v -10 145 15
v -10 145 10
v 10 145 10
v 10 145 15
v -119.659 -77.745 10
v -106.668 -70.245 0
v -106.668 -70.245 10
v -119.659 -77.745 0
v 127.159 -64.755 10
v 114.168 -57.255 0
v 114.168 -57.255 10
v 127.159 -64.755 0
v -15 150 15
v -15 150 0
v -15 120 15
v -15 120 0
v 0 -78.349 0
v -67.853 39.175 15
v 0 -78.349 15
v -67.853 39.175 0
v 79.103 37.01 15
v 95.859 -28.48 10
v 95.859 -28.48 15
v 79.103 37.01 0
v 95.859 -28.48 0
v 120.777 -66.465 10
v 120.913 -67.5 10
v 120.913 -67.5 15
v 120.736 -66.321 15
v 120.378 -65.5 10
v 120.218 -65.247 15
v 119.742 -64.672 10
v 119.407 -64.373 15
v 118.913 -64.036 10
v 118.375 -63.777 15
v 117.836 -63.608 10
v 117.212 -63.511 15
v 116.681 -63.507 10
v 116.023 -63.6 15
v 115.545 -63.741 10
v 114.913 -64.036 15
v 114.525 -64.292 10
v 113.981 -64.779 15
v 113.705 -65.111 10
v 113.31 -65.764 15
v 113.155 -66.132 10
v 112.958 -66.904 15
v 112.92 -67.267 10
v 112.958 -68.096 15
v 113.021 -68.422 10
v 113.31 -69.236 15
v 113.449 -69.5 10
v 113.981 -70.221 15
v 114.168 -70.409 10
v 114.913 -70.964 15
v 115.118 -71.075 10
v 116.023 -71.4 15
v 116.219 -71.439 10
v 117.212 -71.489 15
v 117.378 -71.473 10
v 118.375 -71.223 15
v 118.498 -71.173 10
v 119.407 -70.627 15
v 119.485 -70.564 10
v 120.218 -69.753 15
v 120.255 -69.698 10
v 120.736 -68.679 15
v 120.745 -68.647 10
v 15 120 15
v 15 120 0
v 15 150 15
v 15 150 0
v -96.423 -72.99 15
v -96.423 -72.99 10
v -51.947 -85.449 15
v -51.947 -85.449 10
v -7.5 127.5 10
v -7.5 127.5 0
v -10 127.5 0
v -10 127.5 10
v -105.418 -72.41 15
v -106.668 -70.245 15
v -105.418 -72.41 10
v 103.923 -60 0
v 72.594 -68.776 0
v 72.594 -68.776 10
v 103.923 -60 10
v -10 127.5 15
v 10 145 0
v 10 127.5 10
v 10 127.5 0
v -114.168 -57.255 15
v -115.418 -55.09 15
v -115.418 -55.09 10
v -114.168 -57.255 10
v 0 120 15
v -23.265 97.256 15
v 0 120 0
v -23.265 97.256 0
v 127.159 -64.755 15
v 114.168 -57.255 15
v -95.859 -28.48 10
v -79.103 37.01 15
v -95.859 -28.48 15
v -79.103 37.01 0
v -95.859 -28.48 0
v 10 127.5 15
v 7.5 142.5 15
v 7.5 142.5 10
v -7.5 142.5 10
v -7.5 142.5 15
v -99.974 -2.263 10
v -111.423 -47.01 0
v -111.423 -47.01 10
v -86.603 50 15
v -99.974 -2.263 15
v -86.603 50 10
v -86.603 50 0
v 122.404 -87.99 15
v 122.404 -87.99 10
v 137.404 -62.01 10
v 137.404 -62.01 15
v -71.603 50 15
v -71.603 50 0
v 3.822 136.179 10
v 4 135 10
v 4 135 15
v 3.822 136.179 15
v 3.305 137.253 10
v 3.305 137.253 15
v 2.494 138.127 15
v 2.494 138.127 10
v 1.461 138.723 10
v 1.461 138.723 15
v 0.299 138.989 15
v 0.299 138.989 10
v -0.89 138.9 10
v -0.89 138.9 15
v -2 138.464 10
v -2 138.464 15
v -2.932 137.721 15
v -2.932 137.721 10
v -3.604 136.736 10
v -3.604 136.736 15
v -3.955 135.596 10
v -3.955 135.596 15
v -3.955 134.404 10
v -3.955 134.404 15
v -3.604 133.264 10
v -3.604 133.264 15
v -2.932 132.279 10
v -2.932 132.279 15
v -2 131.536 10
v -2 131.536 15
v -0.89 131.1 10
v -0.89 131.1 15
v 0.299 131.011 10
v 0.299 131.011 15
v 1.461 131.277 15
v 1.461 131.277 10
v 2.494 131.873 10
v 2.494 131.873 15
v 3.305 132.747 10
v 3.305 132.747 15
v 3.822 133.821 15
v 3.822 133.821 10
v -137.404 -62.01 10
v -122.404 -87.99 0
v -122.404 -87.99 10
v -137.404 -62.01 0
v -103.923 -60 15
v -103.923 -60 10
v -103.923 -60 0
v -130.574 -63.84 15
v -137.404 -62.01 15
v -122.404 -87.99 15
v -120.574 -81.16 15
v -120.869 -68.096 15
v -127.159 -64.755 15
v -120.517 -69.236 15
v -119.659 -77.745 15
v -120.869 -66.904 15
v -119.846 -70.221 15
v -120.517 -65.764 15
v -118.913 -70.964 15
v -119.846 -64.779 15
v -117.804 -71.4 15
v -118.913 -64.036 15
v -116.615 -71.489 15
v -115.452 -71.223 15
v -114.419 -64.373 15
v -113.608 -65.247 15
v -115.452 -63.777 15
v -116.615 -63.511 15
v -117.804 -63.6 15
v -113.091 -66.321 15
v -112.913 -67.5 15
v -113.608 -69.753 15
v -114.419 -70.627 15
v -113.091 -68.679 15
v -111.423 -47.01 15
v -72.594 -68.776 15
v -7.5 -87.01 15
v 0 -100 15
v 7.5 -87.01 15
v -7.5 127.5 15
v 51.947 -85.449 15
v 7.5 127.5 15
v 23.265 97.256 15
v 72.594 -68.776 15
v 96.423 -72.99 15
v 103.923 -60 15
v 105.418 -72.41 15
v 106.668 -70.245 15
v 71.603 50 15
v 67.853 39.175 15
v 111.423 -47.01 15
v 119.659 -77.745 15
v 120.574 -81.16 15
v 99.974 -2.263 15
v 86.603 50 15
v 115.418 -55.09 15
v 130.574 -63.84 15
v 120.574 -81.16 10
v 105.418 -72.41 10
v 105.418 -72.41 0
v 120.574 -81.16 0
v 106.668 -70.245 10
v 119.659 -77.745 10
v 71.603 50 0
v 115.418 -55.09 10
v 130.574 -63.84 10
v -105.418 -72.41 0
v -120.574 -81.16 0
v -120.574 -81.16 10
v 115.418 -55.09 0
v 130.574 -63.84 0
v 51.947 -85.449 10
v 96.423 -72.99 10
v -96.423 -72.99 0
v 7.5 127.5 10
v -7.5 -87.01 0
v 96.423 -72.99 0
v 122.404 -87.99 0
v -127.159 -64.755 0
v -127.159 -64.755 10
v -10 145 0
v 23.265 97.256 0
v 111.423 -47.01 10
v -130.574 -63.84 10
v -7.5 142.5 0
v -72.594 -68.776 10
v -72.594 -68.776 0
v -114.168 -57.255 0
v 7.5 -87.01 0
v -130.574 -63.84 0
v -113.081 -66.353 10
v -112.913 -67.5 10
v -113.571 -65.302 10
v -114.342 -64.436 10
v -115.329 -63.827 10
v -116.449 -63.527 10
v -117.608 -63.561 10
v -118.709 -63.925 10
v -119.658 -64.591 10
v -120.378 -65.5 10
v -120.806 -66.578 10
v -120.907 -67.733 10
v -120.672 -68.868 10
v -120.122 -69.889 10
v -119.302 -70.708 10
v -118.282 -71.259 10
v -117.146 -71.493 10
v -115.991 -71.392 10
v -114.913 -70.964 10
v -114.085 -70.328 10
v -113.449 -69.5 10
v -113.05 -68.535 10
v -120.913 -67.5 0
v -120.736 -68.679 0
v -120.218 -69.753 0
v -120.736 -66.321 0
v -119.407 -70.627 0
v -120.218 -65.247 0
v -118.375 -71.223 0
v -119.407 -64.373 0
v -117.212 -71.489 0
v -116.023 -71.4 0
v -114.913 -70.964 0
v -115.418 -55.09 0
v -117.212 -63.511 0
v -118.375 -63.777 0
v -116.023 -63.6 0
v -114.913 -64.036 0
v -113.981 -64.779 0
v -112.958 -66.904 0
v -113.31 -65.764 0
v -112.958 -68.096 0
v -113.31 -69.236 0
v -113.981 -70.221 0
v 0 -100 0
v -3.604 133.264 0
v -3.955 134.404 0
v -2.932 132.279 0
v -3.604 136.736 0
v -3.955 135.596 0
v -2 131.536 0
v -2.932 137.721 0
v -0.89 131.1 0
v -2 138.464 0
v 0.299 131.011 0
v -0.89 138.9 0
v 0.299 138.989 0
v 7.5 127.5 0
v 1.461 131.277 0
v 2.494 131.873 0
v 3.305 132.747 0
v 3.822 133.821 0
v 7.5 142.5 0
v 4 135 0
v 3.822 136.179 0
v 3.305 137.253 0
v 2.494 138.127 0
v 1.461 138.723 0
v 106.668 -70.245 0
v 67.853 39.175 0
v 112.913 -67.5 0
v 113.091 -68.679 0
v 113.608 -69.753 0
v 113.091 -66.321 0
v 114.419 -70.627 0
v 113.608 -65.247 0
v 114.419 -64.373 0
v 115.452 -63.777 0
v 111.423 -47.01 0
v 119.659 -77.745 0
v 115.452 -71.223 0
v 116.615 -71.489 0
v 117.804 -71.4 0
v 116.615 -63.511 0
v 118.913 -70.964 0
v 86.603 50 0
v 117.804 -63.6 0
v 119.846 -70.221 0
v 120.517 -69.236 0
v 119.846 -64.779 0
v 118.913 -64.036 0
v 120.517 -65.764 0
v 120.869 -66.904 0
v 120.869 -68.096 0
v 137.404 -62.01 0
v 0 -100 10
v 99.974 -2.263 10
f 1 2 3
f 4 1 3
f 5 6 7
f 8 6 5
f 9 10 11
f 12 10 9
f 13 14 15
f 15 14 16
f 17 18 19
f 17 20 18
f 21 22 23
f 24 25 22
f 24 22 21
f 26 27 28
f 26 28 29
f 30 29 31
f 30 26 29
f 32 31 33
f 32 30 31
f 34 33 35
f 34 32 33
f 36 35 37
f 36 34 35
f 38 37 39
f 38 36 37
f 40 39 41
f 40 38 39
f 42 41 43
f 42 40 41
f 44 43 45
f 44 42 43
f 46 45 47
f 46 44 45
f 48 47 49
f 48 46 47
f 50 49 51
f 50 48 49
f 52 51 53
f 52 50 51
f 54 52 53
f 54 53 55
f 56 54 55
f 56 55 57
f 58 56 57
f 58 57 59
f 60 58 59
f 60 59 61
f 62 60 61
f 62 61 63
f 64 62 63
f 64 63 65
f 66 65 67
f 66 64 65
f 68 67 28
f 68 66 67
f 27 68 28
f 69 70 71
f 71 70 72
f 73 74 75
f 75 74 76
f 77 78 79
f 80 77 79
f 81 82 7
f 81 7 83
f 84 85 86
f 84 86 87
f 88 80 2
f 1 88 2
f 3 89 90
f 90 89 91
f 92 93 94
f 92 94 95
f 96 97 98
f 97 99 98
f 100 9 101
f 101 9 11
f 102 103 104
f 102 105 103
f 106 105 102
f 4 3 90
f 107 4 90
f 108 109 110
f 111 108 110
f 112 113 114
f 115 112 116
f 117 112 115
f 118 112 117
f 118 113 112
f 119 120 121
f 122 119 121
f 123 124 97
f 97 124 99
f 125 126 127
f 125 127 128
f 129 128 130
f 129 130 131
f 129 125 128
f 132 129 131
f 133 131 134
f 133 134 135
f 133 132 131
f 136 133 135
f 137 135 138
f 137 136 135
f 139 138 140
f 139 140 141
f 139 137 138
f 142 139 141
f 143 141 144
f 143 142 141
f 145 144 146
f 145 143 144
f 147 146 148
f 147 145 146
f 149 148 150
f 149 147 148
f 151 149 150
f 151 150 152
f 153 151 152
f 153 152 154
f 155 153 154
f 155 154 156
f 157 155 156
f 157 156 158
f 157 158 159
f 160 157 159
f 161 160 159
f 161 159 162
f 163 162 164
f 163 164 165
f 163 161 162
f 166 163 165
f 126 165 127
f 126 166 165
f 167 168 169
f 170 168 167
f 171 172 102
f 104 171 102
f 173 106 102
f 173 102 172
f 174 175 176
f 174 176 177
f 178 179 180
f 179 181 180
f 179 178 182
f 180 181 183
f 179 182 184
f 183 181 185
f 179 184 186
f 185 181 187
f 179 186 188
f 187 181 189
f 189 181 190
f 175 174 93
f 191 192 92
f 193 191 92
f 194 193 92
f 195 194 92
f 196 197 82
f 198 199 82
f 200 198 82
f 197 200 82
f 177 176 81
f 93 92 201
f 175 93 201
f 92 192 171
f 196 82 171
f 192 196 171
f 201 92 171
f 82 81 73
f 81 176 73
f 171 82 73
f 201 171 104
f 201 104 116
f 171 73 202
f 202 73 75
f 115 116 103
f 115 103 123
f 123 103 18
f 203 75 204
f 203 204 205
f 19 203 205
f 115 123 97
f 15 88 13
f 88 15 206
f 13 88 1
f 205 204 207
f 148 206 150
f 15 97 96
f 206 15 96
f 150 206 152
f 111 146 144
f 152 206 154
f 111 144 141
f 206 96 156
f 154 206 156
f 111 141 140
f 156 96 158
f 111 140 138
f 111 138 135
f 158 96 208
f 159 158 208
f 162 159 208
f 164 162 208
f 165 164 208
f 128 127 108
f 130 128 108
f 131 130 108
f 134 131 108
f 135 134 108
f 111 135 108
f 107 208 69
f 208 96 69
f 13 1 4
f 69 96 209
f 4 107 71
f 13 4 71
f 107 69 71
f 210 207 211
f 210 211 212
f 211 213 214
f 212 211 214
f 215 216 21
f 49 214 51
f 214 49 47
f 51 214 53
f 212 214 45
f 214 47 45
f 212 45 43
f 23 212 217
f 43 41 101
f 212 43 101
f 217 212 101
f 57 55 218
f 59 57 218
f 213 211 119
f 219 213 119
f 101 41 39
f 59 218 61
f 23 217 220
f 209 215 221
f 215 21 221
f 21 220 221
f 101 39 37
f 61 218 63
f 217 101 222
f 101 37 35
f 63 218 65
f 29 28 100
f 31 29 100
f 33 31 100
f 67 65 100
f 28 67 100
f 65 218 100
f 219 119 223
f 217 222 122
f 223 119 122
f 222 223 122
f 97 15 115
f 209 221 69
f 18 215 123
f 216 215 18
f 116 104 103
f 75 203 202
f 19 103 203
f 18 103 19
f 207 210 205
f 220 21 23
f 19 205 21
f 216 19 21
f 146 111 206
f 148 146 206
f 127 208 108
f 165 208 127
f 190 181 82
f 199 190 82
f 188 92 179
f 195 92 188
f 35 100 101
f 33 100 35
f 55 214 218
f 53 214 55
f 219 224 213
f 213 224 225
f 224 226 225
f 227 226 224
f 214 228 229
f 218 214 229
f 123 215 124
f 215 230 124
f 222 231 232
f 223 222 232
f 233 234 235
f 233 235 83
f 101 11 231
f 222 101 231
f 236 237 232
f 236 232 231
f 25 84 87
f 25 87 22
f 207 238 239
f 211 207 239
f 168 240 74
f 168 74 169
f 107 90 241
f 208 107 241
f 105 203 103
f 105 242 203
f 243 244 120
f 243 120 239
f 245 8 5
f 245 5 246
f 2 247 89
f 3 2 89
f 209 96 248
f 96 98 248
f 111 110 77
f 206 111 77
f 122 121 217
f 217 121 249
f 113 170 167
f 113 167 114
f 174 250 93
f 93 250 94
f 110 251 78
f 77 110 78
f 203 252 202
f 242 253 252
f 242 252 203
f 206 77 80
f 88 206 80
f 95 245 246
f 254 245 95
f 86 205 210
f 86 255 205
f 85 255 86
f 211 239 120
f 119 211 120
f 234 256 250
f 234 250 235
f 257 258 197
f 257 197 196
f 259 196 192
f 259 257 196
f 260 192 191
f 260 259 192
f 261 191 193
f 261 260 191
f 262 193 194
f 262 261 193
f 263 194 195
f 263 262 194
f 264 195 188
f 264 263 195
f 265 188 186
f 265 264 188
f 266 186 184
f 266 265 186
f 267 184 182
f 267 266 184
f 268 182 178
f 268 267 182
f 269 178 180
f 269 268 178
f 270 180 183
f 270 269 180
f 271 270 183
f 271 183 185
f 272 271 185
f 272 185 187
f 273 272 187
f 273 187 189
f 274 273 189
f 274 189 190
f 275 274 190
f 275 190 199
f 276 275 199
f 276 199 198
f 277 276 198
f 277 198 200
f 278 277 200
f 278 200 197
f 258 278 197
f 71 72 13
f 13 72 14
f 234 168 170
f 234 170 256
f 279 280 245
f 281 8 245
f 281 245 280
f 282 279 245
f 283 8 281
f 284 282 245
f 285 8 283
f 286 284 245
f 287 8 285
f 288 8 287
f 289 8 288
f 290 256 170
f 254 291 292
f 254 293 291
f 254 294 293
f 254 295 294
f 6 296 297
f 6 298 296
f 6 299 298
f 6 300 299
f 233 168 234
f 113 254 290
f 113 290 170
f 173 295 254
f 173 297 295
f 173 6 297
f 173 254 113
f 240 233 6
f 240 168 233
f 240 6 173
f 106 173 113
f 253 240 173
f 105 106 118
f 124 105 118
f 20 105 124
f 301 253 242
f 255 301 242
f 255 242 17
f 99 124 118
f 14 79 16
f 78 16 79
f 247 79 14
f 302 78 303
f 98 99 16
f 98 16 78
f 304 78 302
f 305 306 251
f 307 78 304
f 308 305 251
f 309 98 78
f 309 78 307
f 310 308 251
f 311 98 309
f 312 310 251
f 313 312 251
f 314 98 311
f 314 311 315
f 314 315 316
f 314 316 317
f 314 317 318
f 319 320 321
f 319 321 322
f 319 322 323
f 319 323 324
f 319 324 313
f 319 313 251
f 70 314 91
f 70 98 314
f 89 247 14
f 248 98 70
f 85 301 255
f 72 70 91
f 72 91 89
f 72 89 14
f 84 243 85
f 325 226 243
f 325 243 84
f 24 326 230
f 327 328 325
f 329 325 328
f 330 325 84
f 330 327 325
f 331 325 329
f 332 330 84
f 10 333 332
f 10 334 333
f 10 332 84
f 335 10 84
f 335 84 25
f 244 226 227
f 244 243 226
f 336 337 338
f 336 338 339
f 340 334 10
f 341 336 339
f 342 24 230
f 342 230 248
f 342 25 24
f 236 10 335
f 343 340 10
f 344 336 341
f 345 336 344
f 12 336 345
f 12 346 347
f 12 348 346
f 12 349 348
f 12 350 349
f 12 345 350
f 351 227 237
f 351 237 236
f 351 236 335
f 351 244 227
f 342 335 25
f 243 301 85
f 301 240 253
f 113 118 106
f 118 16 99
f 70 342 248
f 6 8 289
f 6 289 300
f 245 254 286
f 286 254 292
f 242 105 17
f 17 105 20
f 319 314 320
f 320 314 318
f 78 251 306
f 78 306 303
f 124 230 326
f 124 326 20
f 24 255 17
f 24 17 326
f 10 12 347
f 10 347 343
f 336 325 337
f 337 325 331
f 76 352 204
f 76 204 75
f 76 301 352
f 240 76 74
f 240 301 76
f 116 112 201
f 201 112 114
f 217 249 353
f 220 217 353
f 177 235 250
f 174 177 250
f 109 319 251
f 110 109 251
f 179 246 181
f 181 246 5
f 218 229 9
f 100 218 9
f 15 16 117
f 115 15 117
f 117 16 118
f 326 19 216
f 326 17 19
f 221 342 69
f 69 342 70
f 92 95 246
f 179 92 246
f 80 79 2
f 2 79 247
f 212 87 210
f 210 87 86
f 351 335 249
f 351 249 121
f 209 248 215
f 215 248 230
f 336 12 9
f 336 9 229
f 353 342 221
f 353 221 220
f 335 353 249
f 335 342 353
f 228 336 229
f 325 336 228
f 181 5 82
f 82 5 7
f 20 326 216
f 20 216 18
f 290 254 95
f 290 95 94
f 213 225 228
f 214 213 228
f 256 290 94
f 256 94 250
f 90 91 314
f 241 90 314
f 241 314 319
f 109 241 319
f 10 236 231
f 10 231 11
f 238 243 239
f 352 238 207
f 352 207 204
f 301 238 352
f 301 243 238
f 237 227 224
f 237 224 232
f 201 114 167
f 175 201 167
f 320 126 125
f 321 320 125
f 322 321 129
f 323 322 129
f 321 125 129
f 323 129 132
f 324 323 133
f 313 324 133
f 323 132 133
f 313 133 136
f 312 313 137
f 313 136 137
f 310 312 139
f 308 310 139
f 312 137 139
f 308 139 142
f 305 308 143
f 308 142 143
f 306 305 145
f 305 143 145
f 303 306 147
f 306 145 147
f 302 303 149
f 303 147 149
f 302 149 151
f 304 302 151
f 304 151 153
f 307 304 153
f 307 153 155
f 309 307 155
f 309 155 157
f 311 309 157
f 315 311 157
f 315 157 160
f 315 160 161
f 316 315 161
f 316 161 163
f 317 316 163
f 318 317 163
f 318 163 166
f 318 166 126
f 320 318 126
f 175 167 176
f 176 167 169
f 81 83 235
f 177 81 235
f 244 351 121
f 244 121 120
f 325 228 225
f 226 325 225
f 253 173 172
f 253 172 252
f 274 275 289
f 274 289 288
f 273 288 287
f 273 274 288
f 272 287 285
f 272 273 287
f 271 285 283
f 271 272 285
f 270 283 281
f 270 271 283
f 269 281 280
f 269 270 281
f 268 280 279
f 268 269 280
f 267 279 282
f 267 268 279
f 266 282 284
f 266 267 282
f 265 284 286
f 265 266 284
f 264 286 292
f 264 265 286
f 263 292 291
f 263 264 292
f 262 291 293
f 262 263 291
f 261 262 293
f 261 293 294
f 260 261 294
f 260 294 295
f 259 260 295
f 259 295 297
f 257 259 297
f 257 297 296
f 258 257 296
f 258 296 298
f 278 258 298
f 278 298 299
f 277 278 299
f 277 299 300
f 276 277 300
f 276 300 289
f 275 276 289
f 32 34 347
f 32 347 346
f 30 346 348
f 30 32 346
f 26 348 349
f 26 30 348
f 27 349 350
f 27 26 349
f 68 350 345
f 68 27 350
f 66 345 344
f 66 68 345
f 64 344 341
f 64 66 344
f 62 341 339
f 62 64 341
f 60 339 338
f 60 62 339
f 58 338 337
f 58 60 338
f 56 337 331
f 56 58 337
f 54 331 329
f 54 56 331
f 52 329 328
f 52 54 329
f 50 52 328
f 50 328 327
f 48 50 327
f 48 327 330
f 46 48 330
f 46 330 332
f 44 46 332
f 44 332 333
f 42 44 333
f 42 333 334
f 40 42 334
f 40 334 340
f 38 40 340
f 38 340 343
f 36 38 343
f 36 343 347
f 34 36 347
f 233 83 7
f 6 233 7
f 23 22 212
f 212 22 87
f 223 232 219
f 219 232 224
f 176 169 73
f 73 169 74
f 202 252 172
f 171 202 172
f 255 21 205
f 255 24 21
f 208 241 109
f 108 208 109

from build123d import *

# Parameters (mm, degrees)
F1_DEPTH  = 10
F2_R      = 4
F3_DEPTH  = 25
F7_DEPTH  = 25
F8_R      = 4
F9_DEPTH  = 5
F10_DEPTH = 5


# Not quite as in the source:
# - after a boolean that leaves OpenCascade's solid faulty, fix() repairs it


with BuildPart() as f1:
    # F0 (on Top) → F1 (new body)
    with BuildSketch(Plane.XY):
        Polygon((0, 0), (86.6025403784, 50), (71.6025403784, 50), (0, 50), align=None)
        Polygon((-86.6025403784, 50), (0, 0), (0, 50), (-71.6025403784, 50), align=None)
        Polygon((0, 120), (15, 120), (15, 150), (-15, 150), (-15, 120), align=None)
        Polygon((10, 125), (0, 125), (-10, 125), (-10, 127.5), (-10, 145), (10, 145), (10, 127.5), align=None, mode=Mode.SUBTRACT)
        with BuildLine():
            Line((71.6025403784, 50), (86.6025403784, 50))
            Line((86.6025403784, 50), (48.027253047, 87.7119317126))
            ThreePointArc((48.027253047, 87.7119317126), (35.9639012974, 93.309151767), (23.2645159855, 97.2561684211))
            Line((23.2645159855, 97.2561684211), (71.6025403784, 50))
        make_face()
        with BuildLine():
            Line((-48.027253047, 87.7119317126), (-86.6025403784, 50))
            Line((-86.6025403784, 50), (-71.6025403784, 50))
            Line((-71.6025403784, 50), (-23.2645159855, 97.2561684211))
            ThreePointArc((-23.2645159855, 97.2561684211), (-35.9639012974, 93.309151767), (-48.027253047, 87.7119317126))
        make_face()
        with BuildLine():
            ThreePointArc((23.2645159855, 97.2561684211), (35.9639012974, 93.309151767), (48.027253047, 87.7119317126))
            Line((48.027253047, 87.7119317126), (15, 120))
            Line((15, 120), (0, 120))
            Line((0, 120), (23.2645159855, 97.2561684211))
        make_face()
        with BuildLine():
            Line((-23.2645159855, 97.2561684211), (0, 120))
            Line((0, 120), (-15, 120))
            Line((-15, 120), (-48.027253047, 87.7119317126))
            ThreePointArc((-48.027253047, 87.7119317126), (-35.9639012974, 93.309151767), (-23.2645159855, 97.2561684211))
        make_face()
        Polygon((-7.5, 127.5), (7.5, 127.5), (0, 135), align=None)
        Polygon((0, 135), (7.5, 127.5), (7.5, 142.5), align=None)
        Polygon((-7.5, 142.5), (-7.5, 127.5), (0, 135), align=None)
        Polygon((0, 135), (7.5, 142.5), (-7.5, 142.5), align=None)
        Polygon((-10, 125), (0, 125), (10, 125), (10, 127.5), (7.5, 127.5), (-7.5, 127.5), (-10, 127.5), align=None)
    extrude(amount=F1_DEPTH)

    # F2 (on face) → F3 (cut)
    with BuildSketch(Plane.XY.offset(10)):
        with Locations((0, 135)):
            Circle(F2_R)
    extrude(amount=-F3_DEPTH, mode=Mode.SUBTRACT)


with BuildPart() as f4_1:
    # F4: instance of F1
    add(f1.part.mirror(Plane(origin=(-43.3012701892, 25, 5), x_dir=(0.8660254038, -0.5, 0), z_dir=(-0.5, -0.8660254038, 0))))


with BuildPart() as f1_1:
    add(f1.part)

    add(f4_1.part)  # F5 merges F4_1
    # F5: F1 across face
    add(f1.part.mirror(Plane(origin=(43.3012701892, 25, 5), x_dir=(0.8660254038, 0.5, 0), z_dir=(0.5, -0.8660254038, 0))))

    # F6 (on face) → F7 (cut)
    with BuildSketch(Plane.XY.offset(10)):
        Polygon((67.8525403784, 39.1746824527), (-67.8525403784, 39.1746824527), (0, -78.3493649054), align=None)
    extrude(amount=-F7_DEPTH, mode=Mode.SUBTRACT)

    # F8 (on face) → F9 (join)
    with BuildSketch(Plane.XY.offset(10)):
        with BuildLine():
            Line((0, 120), (-15, 120))
            Line((-15, 120), (-48.027253047, 87.7119317126))
            ThreePointArc((-48.027253047, 87.7119317126), (-35.9639012974, 93.3091517669), (-23.2645159855, 97.2561684211))
            Line((-23.2645159855, 97.2561684211), (0, 120))
        make_face()
        with BuildLine():
            Line((15, 120), (0, 120))
            Line((0, 120), (23.2645159855, 97.2561684211))
            ThreePointArc((23.2645159855, 97.2561684211), (35.9639012974, 93.3091517669), (48.027253047, 87.7119317126))
            Line((48.027253047, 87.7119317126), (15, 120))
        make_face()
        Polygon((15, 150), (-15, 150), (-15, 120), (0, 120), (15, 120), align=None)
        with Locations((0, 135)):
            Circle(F8_R, mode=Mode.SUBTRACT)
        Polygon((-7.5, 127.5), (-10, 127.5), (-10, 145), (10, 145), (10, 127.5), (7.5, 127.5), (7.5, 142.5), (-7.5, 142.5), align=None, mode=Mode.SUBTRACT)
        Polygon((137.4038105677, -62.0096189432), (111.4230484541, -47.0096189432), (103.9230484541, -60), (96.4230484541, -72.9903810568), (122.4038105677, -87.9903810568), align=None)
        Polygon((119.6586200393, -77.7451905284), (127.1586200393, -64.7548094716), (114.1682389825, -57.2548094716), (115.4182389825, -55.0897459622), (130.5736835487, -63.8397459622), (120.5736835487, -81.1602540378), (105.4182389825, -72.4102540378), (106.6682389825, -70.2451905284), align=None, mode=Mode.SUBTRACT)
        with Locations((116.9134295109, -67.5)):
            Circle(F8_R, mode=Mode.SUBTRACT)
        with BuildLine():
            Line((111.4230484541, -47.0096189432), (99.9743876016, -2.2631446437))
            ThreePointArc((99.9743876016, -2.2631446437), (98.7900464845, -15.5089237407), (95.8585705202, -28.4804223604))
            Line((95.8585705202, -28.4804223604), (103.9230484541, -60))
            Line((103.9230484541, -60), (111.4230484541, -47.0096189432))
        make_face()
        with BuildLine():
            Line((103.9230484541, -60), (72.5940545347, -68.7757460608))
            ThreePointArc((72.5940545347, -68.7757460608), (62.826145187, -77.8002280263), (51.9471345547, -85.448787069))
            Line((51.9471345547, -85.448787069), (96.4230484541, -72.9903810568))
            Line((96.4230484541, -72.9903810568), (103.9230484541, -60))
        make_face()
        Polygon((-103.9230484541, -60), (-111.4230484541, -47.0096189432), (-137.4038105677, -62.0096189432), (-122.4038105677, -87.9903810568), (-96.4230484541, -72.9903810568), align=None)
        Polygon((-120.5736835487, -81.1602540378), (-130.5736835487, -63.8397459622), (-115.4182389825, -55.0897459622), (-114.1682389825, -57.2548094716), (-127.1586200393, -64.7548094716), (-119.6586200393, -77.7451905284), (-106.6682389825, -70.2451905284), (-105.4182389825, -72.4102540378), align=None, mode=Mode.SUBTRACT)
        with Locations((-116.9134295109, -67.5)):
            Circle(F8_R, mode=Mode.SUBTRACT)
        with BuildLine():
            ThreePointArc((-95.8585705202, -28.4804223604), (-98.7900464845, -15.5089237407), (-99.9743876016, -2.2631446437))
            Line((-99.9743876016, -2.2631446437), (-111.4230484541, -47.0096189432))
            Line((-111.4230484541, -47.0096189432), (-103.9230484541, -60))
            Line((-103.9230484541, -60), (-95.8585705202, -28.4804223604))
        make_face()
        with BuildLine():
            Line((-72.5940545347, -68.7757460608), (-103.9230484541, -60))
            Line((-103.9230484541, -60), (-96.4230484541, -72.9903810568))
            Line((-96.4230484541, -72.9903810568), (-51.9471345547, -85.448787069))
            ThreePointArc((-51.9471345547, -85.448787069), (-62.826145187, -77.8002280263), (-72.5940545347, -68.7757460608))
        make_face()
    extrude(amount=F9_DEPTH)

    # F10 (add): a face of the model
    f10_faces = [f1_1.faces().sort_by_distance(p)[0] for p in [
        (25.2159598464, -90.0197712228, 10),
    ]]
    extrude(f10_faces, amount=F10_DEPTH)

    add(f1_1.part.fix(), mode=Mode.REPLACE)


solid = f1_1.part
